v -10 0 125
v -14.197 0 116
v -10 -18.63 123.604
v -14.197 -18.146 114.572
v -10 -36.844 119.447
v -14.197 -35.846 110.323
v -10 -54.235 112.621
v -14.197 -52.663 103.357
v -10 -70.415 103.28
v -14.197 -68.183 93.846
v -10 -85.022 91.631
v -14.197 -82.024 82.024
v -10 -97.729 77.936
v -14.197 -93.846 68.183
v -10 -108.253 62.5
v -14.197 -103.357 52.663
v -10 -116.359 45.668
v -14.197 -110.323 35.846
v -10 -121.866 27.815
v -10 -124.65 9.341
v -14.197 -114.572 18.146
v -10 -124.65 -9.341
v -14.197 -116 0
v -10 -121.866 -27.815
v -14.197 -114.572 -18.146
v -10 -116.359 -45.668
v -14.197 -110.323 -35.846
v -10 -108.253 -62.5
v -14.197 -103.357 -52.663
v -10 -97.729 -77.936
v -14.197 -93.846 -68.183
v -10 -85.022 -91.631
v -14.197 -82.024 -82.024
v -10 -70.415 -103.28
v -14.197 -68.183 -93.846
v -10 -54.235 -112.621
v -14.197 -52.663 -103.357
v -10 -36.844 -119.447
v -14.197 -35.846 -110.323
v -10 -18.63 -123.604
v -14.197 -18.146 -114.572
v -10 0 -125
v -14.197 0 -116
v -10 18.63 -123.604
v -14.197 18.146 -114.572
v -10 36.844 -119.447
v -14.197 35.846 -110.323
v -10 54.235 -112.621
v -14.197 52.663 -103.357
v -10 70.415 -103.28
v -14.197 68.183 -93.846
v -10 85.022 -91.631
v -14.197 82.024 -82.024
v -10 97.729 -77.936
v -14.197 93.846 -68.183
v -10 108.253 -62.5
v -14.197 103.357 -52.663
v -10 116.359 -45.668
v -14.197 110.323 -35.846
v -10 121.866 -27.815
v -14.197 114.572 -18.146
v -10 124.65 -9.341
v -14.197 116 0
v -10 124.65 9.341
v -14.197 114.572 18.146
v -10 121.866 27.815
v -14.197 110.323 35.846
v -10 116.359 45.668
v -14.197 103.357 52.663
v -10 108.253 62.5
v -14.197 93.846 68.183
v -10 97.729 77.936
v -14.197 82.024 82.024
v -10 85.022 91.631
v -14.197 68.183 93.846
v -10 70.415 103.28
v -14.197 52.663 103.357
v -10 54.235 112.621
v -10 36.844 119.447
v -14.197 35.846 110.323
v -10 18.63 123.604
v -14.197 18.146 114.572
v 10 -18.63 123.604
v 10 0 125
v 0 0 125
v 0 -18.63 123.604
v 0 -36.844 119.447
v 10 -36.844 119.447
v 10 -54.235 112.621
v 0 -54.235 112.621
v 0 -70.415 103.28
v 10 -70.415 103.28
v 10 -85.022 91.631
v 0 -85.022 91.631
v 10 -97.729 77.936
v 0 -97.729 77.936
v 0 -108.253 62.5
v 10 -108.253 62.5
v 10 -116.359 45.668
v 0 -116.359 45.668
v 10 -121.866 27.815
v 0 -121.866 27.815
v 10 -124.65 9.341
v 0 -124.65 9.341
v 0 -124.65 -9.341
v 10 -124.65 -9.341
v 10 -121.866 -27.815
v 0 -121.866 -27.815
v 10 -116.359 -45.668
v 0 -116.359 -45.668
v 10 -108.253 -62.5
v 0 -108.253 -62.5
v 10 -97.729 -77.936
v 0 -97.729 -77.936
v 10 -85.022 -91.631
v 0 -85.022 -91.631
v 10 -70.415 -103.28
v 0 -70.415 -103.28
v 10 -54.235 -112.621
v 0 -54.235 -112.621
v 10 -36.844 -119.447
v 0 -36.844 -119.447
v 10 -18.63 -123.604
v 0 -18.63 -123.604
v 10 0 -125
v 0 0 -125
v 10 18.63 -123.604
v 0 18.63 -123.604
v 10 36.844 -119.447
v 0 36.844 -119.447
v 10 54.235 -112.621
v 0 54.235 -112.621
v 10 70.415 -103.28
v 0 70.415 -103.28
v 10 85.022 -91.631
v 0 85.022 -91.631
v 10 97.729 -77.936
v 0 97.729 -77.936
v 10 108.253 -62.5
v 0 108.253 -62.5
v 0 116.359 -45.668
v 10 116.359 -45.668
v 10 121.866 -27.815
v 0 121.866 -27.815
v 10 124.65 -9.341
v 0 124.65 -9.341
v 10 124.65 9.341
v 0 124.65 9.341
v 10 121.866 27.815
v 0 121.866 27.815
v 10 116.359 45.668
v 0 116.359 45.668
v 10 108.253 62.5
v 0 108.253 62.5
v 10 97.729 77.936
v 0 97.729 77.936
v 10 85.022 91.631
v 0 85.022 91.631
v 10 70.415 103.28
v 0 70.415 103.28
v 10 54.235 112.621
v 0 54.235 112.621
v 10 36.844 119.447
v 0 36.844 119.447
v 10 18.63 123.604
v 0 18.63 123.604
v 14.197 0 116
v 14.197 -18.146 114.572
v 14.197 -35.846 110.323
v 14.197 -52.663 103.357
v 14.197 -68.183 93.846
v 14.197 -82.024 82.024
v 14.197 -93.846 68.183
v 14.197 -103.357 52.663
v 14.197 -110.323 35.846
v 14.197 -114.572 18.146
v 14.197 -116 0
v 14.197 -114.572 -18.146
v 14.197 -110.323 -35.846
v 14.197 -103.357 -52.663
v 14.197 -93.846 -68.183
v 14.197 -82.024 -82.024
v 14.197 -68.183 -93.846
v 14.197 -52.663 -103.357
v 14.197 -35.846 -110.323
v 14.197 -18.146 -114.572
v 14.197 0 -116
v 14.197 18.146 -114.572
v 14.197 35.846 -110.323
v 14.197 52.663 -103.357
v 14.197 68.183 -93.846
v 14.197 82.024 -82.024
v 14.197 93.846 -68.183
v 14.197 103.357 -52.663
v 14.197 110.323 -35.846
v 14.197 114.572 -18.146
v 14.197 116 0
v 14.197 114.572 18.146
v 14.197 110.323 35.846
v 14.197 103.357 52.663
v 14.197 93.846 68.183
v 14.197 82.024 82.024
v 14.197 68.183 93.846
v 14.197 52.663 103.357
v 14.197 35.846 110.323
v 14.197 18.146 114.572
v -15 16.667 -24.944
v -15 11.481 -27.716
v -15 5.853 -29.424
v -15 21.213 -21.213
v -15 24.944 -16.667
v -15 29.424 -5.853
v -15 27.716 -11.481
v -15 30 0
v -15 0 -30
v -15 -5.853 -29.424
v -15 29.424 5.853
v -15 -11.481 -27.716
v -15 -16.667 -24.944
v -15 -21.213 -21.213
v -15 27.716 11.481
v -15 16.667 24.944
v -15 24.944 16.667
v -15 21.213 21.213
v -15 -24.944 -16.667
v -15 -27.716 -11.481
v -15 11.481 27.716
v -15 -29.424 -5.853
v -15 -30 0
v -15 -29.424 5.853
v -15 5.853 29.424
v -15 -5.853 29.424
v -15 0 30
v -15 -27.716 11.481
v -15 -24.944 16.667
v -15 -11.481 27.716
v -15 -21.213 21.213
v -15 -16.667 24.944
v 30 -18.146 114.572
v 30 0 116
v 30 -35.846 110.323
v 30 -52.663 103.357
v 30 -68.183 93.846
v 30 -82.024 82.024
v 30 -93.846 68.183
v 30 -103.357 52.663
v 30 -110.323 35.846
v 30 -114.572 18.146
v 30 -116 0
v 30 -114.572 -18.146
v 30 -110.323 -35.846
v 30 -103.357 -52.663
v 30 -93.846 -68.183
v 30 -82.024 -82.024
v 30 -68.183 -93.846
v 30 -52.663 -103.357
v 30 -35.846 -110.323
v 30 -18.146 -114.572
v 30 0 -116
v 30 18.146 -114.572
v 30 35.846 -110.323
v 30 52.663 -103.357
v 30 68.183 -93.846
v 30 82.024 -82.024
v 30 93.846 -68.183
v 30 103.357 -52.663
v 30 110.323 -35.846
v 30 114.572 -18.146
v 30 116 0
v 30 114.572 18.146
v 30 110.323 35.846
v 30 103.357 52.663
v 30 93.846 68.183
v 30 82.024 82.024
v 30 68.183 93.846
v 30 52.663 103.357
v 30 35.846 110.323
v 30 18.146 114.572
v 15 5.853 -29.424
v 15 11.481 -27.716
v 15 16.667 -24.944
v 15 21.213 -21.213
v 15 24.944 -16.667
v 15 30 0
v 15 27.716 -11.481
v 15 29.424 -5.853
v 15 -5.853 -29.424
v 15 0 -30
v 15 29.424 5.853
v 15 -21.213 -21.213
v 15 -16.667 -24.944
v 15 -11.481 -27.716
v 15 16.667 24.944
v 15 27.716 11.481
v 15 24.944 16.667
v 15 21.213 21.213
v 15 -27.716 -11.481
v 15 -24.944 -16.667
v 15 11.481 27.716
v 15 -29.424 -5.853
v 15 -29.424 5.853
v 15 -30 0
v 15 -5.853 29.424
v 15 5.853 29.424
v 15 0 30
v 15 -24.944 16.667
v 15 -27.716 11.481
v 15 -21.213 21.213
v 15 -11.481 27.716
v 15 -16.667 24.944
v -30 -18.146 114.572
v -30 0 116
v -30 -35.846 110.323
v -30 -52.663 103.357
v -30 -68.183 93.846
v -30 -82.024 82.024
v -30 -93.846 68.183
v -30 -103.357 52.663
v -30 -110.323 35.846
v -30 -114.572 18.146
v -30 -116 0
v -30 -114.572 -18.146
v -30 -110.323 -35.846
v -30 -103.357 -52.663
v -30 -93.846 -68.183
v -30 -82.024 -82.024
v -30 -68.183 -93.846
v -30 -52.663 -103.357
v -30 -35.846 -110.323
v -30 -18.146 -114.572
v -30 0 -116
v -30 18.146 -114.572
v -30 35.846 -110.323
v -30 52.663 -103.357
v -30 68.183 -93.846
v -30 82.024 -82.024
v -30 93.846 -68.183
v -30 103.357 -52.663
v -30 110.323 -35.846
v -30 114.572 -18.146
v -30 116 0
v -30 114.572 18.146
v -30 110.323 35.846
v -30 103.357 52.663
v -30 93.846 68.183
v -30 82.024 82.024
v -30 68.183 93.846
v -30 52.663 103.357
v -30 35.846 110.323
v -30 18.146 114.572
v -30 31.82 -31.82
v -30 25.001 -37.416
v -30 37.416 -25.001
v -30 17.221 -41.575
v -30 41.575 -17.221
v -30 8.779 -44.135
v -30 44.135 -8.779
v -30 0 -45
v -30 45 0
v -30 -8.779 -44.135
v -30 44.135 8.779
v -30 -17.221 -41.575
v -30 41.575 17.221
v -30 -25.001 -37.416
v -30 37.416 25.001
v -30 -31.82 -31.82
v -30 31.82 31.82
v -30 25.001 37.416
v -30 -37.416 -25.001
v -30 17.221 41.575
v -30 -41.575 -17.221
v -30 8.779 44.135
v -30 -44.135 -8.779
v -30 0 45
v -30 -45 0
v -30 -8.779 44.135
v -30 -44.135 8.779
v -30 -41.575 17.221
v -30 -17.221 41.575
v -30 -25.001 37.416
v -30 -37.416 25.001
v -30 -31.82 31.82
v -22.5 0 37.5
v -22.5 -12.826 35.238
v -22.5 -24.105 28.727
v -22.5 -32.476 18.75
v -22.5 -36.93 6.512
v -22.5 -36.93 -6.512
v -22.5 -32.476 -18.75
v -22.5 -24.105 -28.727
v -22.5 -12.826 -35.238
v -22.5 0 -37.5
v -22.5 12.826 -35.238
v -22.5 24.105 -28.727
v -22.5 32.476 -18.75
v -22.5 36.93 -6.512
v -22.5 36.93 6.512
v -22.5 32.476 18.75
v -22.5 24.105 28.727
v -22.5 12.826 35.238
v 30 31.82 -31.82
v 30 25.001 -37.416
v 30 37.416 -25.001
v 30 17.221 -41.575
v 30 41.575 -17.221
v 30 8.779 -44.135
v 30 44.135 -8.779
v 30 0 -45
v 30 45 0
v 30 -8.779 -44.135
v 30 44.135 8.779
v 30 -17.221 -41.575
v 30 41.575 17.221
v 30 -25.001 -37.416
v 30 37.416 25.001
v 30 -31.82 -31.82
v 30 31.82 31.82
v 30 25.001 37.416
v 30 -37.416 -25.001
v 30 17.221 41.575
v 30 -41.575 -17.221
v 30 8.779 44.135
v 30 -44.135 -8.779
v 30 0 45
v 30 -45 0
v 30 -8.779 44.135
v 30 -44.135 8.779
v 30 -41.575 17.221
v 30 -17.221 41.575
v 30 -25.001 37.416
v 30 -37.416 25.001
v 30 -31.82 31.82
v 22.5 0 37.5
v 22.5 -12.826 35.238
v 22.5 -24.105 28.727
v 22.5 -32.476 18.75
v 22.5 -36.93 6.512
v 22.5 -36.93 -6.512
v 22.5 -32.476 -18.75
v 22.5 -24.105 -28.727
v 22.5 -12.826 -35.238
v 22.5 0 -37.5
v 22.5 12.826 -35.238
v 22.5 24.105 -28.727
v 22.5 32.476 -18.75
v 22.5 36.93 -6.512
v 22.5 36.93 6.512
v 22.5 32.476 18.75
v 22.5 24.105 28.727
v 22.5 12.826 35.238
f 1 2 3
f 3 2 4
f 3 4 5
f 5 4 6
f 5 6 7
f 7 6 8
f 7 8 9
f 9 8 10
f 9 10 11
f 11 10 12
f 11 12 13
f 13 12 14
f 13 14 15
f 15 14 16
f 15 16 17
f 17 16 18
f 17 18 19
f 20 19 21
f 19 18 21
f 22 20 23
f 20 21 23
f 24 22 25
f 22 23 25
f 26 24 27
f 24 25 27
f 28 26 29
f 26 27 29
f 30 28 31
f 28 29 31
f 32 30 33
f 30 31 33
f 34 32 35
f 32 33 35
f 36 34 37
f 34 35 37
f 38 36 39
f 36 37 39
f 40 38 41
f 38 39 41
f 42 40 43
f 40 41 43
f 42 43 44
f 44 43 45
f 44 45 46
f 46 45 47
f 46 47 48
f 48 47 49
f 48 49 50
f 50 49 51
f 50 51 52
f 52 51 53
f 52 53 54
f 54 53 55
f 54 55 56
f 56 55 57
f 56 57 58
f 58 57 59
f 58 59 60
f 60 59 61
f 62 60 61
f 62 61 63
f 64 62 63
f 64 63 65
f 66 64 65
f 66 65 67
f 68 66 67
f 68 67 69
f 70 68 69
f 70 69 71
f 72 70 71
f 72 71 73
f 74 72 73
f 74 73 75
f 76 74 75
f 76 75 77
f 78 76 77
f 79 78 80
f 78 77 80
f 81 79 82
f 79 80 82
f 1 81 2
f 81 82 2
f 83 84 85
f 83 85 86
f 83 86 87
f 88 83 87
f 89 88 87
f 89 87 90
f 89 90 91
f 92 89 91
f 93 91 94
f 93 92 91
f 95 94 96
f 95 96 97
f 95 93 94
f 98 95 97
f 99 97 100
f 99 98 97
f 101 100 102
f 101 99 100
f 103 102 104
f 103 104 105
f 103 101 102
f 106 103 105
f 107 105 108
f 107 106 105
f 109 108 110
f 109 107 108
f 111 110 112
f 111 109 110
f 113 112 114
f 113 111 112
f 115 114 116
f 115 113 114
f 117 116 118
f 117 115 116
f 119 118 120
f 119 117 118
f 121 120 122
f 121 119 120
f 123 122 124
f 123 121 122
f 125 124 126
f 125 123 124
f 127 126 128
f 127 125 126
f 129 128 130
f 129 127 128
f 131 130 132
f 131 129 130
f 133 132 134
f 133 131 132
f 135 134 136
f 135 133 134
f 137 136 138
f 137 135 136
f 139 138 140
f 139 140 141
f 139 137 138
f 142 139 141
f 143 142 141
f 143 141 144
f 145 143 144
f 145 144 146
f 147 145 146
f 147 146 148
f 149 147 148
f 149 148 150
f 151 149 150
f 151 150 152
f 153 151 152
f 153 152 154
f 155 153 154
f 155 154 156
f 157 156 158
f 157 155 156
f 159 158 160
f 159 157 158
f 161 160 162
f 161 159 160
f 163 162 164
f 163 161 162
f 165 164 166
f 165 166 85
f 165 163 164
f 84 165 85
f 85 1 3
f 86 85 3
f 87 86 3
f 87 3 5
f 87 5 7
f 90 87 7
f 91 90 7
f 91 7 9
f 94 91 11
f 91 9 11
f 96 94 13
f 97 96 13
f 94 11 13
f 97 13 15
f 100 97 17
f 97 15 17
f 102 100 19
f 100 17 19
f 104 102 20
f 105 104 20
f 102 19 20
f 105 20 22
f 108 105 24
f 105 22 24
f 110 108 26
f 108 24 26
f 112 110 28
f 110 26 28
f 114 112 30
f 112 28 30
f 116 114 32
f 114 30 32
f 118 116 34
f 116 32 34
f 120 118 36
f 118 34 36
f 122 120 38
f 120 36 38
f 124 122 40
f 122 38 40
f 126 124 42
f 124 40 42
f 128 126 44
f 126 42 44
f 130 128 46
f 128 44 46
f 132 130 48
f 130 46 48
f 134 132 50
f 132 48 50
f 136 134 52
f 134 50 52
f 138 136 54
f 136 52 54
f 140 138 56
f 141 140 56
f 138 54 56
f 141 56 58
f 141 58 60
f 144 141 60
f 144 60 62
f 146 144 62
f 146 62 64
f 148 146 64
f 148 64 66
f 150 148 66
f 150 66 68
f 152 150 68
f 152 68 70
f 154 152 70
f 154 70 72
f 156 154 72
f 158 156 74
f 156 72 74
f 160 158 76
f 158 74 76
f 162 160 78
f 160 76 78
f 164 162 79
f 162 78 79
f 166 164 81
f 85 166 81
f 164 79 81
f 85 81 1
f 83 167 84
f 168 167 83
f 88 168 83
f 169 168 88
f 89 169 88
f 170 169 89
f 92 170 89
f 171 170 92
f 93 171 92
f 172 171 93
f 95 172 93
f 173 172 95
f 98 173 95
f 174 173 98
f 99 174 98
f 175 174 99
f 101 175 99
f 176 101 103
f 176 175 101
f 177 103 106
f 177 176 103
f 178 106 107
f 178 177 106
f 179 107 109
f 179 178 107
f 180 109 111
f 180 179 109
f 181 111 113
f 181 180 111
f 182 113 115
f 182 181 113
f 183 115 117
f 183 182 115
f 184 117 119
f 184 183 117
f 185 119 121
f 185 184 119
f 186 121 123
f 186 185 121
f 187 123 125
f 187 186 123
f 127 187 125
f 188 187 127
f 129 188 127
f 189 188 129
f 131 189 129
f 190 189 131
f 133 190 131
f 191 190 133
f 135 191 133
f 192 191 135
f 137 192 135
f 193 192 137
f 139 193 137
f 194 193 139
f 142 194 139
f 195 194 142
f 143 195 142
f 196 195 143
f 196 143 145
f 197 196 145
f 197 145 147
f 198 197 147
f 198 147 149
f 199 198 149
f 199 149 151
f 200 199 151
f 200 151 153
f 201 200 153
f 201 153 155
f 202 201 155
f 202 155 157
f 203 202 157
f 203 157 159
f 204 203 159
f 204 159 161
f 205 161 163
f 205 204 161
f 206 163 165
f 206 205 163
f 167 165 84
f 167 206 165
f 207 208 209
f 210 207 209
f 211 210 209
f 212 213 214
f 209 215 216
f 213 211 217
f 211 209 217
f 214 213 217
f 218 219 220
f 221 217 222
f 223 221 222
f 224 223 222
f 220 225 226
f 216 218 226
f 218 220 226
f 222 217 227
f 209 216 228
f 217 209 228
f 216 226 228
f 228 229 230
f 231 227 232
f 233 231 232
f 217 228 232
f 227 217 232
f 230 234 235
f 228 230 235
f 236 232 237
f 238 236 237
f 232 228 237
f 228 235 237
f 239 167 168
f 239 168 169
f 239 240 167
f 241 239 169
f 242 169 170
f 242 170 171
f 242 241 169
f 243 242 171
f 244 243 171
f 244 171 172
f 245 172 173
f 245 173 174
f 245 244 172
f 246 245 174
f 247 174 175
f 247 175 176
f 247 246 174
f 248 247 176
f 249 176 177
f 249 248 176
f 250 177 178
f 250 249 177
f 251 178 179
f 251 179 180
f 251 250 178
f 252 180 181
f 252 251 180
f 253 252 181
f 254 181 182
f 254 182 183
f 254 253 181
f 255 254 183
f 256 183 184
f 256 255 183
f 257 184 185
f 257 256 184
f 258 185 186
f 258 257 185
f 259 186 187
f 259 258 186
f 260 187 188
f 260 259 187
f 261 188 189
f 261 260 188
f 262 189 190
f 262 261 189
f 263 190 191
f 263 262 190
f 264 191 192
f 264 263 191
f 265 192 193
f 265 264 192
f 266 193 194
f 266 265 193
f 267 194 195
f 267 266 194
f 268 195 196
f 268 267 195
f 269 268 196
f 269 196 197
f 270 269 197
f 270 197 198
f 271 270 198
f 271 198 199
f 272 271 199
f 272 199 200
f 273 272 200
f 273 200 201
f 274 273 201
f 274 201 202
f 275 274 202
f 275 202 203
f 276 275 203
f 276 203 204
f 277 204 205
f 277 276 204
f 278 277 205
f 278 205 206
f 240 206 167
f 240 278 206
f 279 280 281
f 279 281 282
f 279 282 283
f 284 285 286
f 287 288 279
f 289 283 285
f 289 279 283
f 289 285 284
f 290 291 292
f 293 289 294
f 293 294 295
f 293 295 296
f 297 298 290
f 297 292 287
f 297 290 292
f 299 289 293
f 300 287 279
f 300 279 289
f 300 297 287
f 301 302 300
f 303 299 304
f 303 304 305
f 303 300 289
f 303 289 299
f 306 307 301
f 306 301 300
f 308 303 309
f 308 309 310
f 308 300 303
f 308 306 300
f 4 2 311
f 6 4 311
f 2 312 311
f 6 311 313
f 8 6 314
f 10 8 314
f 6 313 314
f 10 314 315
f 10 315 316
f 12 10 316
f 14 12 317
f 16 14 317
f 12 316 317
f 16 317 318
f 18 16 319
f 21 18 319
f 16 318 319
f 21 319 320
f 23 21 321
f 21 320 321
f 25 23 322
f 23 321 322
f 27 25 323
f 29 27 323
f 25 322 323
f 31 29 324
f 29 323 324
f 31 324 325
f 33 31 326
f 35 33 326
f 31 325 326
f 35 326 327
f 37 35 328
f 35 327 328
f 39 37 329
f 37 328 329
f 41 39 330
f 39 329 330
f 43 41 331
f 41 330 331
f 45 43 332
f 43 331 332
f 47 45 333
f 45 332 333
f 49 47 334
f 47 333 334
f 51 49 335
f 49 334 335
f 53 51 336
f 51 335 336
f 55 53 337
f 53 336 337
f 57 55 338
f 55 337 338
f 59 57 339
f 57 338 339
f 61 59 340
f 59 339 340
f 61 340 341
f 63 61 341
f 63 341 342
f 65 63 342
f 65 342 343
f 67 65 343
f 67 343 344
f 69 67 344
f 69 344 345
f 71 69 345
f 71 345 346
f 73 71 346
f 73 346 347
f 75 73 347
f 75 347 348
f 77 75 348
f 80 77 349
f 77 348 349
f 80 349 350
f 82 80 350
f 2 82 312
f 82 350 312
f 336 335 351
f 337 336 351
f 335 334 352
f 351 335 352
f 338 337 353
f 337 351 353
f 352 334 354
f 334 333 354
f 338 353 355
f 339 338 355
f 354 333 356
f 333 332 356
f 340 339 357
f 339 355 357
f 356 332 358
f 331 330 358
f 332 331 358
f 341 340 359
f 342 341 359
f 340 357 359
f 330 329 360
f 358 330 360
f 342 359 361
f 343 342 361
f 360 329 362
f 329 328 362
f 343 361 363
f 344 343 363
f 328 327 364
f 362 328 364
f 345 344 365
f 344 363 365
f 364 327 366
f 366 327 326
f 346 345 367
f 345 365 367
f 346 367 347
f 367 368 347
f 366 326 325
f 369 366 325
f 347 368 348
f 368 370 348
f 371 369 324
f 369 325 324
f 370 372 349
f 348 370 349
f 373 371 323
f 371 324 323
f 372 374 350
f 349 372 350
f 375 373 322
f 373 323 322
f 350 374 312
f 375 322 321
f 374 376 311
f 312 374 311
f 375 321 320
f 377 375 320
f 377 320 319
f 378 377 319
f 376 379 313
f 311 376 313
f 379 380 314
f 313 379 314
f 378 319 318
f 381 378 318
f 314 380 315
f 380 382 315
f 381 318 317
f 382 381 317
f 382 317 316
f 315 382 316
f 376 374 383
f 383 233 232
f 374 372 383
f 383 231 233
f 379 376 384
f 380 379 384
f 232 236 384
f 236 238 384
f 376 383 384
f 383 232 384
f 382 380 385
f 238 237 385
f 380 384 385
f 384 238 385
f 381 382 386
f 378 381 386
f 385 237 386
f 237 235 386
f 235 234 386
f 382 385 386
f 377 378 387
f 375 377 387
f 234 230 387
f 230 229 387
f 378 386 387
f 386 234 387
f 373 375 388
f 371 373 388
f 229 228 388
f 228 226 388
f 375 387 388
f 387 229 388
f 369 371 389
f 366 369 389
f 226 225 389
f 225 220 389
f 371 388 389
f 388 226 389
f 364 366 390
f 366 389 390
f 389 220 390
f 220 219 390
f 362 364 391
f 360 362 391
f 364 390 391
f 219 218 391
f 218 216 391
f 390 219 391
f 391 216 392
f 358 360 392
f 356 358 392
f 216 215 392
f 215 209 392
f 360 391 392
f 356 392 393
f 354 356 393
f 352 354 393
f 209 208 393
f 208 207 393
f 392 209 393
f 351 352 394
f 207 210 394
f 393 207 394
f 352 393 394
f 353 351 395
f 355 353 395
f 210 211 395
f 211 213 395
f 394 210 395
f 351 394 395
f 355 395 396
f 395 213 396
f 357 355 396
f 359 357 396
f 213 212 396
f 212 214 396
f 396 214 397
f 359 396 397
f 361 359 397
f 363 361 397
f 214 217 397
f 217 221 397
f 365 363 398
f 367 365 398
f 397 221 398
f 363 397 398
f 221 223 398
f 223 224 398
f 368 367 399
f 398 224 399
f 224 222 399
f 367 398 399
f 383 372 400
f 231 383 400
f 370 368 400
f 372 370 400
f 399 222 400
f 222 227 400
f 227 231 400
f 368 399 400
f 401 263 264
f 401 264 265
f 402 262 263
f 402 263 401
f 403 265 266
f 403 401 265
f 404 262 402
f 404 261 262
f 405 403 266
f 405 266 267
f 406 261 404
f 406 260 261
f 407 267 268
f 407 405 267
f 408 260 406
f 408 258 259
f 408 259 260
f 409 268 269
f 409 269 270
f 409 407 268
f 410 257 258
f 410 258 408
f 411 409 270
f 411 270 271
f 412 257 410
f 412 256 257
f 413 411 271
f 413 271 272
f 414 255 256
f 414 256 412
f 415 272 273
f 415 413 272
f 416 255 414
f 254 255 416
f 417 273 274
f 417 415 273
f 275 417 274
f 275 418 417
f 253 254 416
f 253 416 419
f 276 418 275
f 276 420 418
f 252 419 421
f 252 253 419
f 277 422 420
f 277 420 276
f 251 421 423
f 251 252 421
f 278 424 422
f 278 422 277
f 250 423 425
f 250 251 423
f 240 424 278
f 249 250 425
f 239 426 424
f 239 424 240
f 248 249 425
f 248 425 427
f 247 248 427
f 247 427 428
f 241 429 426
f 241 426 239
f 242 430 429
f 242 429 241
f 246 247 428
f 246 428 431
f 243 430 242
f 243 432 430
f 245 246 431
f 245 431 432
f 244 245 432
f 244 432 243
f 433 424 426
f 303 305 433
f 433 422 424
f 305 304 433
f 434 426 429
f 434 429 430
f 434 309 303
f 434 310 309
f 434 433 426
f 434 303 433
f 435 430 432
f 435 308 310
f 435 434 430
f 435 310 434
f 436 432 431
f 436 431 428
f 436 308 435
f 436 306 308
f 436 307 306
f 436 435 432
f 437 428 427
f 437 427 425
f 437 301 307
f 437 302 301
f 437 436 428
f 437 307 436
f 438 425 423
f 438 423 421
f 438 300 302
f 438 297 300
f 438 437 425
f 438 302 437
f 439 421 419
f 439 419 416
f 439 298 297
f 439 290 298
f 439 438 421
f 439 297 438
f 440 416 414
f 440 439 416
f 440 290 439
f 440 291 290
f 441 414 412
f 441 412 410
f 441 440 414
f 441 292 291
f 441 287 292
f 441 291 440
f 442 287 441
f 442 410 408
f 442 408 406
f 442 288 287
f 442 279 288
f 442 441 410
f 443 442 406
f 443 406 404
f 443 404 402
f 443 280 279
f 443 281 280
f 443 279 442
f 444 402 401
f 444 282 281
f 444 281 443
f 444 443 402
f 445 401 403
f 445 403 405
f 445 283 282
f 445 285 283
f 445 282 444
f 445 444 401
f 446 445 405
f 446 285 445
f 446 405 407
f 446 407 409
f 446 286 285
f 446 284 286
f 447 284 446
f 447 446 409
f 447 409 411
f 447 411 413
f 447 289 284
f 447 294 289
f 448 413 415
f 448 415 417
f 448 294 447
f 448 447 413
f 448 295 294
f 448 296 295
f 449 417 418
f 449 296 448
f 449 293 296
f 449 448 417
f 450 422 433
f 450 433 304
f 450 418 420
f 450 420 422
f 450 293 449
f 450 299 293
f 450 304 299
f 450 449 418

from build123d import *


with BuildPart() as part:
    # Sketch1 → Revolve1 (revolve)
    with BuildSketch(Plane.XY, mode=Mode.PRIVATE) as revolve1_sk:
        Polygon((0, 0), (0, 125), (-10, 125), (-14.196768923, 116), (-30, 116), (-30, 45), (-15, 30), (-15, 0), align=None)
    revolve(revolve1_sk.sketch.rotate(Axis((0, 0, 0), (1, 0, 0)), 90), axis=Axis((0, 0, 0), (1, 0, 0)))

    # Mirror1: part across plane


with BuildPart() as part_1:
    add(part.part)
    add(part.part.mirror(Plane.ZY))


solid = part_1.part
